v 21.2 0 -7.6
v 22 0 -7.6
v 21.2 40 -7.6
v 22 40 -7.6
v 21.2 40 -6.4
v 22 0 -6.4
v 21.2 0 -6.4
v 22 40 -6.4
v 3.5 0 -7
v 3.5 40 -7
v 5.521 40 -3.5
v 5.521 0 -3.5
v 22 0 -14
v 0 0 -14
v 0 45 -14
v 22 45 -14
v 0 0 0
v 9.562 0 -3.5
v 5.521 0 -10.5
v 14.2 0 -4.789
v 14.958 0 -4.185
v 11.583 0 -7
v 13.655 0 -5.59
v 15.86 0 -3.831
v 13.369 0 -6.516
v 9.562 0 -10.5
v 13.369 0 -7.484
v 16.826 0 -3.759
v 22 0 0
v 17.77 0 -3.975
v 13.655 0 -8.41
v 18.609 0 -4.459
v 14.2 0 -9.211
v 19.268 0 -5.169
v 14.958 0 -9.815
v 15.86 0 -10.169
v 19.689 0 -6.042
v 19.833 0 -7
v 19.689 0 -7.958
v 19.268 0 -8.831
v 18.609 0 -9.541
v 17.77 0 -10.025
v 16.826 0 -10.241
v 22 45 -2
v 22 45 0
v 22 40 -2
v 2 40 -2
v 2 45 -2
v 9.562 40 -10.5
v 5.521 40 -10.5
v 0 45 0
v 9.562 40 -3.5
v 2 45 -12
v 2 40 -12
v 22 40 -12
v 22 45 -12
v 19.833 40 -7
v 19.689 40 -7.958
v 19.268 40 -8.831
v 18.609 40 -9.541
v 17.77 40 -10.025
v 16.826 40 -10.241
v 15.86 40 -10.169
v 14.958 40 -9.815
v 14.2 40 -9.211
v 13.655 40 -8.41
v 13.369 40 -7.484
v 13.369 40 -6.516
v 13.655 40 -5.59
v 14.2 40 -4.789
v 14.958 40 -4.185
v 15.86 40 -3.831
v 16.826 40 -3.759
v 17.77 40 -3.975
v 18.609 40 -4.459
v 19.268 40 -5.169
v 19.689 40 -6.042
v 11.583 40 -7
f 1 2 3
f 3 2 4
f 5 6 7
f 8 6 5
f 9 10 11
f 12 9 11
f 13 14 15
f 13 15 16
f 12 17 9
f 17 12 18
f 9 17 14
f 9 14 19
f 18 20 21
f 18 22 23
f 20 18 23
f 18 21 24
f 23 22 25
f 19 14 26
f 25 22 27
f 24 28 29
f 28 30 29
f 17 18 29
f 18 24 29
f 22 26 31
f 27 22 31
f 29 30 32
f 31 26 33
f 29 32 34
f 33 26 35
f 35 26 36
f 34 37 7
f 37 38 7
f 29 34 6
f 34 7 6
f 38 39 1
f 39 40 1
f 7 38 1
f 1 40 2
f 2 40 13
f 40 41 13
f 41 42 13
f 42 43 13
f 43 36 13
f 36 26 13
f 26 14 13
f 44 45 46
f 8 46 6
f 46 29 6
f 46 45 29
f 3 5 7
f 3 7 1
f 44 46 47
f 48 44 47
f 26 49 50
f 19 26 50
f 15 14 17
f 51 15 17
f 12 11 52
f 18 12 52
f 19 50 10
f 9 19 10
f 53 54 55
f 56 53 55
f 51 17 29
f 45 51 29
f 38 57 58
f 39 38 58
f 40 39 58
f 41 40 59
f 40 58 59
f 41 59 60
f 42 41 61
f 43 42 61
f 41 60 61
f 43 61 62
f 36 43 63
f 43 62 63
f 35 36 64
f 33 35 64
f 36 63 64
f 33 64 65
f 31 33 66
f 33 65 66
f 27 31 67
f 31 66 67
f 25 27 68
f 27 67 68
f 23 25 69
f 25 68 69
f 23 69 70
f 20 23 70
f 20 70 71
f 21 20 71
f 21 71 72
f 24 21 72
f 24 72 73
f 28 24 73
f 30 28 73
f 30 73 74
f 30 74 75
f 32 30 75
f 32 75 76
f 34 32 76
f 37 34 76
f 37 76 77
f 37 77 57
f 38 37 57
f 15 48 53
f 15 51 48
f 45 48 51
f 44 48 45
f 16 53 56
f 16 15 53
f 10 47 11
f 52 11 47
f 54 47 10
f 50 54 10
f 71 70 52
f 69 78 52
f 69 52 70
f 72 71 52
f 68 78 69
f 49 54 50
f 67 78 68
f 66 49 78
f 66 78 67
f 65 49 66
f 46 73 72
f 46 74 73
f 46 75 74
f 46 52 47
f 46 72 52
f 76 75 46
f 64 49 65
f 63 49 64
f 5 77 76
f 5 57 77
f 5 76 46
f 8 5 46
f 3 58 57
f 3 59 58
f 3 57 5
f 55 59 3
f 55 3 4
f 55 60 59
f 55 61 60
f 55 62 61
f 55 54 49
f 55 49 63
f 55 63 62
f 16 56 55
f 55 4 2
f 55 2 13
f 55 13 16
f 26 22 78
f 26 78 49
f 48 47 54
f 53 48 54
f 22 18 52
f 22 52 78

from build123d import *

# Parameters (mm, degrees)
SKETCH1_W           = 22
SKETCH1_H           = 14
BOSS_EXTRUDE1_DEPTH = 40
BOSS_EXTRUDE2_DEPTH = 5
SKETCH3_R           = 3.25
CUT_EXTRUDE1_DEPTH  = 41
SKETCH4_W           = 1.2
SKETCH4_H           = 40
CUT_EXTRUDE2_DEPTH  = 0.8


with BuildPart() as part:
    # Sketch1 → Boss-Extrude1 (new body)
    with BuildSketch(Plane(origin=(0, 0, 0), x_dir=(1, 0, 0), z_dir=(0, 1, 0))):
        with Locations((11, 7)):
            Rectangle(SKETCH1_W, SKETCH1_H)
    extrude(amount=BOSS_EXTRUDE1_DEPTH)

    # Sketch2 → Boss-Extrude2 (add)
    with BuildSketch(Plane(origin=(0, 40, 0), x_dir=(1, 0, 0), z_dir=(0, 1, 0))):
        Polygon((22, 0), (22, 2), (2, 2), (2, 12), (22, 12), (22, 14), (0, 14), (0, 0), align=None)
    extrude(amount=BOSS_EXTRUDE2_DEPTH)

    # Sketch3 → Cut-Extrude1 (cut, through all)
    with BuildSketch(Plane(origin=(0, 40, 0), x_dir=(1, 0, 0), z_dir=(0, 1, 0))):
        with Locations((16.582903769, 7)):
            Circle(SKETCH3_R)
        Polygon((11.582903769, 7), (9.562177826, 10.5), (5.520725942, 10.5), (3.5, 7), (5.520725942, 3.5), (9.562177826, 3.5), align=None)
    extrude(amount=-CUT_EXTRUDE1_DEPTH, mode=Mode.SUBTRACT)

    # Sketch4 → Cut-Extrude2 (cut)
    with BuildSketch(Plane(origin=(22, 0, 0), x_dir=(0, 0, -1), z_dir=(1, 0, 0))):
        with Locations((7, 20)):
            Rectangle(SKETCH4_W, SKETCH4_H)
    extrude(amount=-CUT_EXTRUDE2_DEPTH, mode=Mode.SUBTRACT)


solid = part.part
